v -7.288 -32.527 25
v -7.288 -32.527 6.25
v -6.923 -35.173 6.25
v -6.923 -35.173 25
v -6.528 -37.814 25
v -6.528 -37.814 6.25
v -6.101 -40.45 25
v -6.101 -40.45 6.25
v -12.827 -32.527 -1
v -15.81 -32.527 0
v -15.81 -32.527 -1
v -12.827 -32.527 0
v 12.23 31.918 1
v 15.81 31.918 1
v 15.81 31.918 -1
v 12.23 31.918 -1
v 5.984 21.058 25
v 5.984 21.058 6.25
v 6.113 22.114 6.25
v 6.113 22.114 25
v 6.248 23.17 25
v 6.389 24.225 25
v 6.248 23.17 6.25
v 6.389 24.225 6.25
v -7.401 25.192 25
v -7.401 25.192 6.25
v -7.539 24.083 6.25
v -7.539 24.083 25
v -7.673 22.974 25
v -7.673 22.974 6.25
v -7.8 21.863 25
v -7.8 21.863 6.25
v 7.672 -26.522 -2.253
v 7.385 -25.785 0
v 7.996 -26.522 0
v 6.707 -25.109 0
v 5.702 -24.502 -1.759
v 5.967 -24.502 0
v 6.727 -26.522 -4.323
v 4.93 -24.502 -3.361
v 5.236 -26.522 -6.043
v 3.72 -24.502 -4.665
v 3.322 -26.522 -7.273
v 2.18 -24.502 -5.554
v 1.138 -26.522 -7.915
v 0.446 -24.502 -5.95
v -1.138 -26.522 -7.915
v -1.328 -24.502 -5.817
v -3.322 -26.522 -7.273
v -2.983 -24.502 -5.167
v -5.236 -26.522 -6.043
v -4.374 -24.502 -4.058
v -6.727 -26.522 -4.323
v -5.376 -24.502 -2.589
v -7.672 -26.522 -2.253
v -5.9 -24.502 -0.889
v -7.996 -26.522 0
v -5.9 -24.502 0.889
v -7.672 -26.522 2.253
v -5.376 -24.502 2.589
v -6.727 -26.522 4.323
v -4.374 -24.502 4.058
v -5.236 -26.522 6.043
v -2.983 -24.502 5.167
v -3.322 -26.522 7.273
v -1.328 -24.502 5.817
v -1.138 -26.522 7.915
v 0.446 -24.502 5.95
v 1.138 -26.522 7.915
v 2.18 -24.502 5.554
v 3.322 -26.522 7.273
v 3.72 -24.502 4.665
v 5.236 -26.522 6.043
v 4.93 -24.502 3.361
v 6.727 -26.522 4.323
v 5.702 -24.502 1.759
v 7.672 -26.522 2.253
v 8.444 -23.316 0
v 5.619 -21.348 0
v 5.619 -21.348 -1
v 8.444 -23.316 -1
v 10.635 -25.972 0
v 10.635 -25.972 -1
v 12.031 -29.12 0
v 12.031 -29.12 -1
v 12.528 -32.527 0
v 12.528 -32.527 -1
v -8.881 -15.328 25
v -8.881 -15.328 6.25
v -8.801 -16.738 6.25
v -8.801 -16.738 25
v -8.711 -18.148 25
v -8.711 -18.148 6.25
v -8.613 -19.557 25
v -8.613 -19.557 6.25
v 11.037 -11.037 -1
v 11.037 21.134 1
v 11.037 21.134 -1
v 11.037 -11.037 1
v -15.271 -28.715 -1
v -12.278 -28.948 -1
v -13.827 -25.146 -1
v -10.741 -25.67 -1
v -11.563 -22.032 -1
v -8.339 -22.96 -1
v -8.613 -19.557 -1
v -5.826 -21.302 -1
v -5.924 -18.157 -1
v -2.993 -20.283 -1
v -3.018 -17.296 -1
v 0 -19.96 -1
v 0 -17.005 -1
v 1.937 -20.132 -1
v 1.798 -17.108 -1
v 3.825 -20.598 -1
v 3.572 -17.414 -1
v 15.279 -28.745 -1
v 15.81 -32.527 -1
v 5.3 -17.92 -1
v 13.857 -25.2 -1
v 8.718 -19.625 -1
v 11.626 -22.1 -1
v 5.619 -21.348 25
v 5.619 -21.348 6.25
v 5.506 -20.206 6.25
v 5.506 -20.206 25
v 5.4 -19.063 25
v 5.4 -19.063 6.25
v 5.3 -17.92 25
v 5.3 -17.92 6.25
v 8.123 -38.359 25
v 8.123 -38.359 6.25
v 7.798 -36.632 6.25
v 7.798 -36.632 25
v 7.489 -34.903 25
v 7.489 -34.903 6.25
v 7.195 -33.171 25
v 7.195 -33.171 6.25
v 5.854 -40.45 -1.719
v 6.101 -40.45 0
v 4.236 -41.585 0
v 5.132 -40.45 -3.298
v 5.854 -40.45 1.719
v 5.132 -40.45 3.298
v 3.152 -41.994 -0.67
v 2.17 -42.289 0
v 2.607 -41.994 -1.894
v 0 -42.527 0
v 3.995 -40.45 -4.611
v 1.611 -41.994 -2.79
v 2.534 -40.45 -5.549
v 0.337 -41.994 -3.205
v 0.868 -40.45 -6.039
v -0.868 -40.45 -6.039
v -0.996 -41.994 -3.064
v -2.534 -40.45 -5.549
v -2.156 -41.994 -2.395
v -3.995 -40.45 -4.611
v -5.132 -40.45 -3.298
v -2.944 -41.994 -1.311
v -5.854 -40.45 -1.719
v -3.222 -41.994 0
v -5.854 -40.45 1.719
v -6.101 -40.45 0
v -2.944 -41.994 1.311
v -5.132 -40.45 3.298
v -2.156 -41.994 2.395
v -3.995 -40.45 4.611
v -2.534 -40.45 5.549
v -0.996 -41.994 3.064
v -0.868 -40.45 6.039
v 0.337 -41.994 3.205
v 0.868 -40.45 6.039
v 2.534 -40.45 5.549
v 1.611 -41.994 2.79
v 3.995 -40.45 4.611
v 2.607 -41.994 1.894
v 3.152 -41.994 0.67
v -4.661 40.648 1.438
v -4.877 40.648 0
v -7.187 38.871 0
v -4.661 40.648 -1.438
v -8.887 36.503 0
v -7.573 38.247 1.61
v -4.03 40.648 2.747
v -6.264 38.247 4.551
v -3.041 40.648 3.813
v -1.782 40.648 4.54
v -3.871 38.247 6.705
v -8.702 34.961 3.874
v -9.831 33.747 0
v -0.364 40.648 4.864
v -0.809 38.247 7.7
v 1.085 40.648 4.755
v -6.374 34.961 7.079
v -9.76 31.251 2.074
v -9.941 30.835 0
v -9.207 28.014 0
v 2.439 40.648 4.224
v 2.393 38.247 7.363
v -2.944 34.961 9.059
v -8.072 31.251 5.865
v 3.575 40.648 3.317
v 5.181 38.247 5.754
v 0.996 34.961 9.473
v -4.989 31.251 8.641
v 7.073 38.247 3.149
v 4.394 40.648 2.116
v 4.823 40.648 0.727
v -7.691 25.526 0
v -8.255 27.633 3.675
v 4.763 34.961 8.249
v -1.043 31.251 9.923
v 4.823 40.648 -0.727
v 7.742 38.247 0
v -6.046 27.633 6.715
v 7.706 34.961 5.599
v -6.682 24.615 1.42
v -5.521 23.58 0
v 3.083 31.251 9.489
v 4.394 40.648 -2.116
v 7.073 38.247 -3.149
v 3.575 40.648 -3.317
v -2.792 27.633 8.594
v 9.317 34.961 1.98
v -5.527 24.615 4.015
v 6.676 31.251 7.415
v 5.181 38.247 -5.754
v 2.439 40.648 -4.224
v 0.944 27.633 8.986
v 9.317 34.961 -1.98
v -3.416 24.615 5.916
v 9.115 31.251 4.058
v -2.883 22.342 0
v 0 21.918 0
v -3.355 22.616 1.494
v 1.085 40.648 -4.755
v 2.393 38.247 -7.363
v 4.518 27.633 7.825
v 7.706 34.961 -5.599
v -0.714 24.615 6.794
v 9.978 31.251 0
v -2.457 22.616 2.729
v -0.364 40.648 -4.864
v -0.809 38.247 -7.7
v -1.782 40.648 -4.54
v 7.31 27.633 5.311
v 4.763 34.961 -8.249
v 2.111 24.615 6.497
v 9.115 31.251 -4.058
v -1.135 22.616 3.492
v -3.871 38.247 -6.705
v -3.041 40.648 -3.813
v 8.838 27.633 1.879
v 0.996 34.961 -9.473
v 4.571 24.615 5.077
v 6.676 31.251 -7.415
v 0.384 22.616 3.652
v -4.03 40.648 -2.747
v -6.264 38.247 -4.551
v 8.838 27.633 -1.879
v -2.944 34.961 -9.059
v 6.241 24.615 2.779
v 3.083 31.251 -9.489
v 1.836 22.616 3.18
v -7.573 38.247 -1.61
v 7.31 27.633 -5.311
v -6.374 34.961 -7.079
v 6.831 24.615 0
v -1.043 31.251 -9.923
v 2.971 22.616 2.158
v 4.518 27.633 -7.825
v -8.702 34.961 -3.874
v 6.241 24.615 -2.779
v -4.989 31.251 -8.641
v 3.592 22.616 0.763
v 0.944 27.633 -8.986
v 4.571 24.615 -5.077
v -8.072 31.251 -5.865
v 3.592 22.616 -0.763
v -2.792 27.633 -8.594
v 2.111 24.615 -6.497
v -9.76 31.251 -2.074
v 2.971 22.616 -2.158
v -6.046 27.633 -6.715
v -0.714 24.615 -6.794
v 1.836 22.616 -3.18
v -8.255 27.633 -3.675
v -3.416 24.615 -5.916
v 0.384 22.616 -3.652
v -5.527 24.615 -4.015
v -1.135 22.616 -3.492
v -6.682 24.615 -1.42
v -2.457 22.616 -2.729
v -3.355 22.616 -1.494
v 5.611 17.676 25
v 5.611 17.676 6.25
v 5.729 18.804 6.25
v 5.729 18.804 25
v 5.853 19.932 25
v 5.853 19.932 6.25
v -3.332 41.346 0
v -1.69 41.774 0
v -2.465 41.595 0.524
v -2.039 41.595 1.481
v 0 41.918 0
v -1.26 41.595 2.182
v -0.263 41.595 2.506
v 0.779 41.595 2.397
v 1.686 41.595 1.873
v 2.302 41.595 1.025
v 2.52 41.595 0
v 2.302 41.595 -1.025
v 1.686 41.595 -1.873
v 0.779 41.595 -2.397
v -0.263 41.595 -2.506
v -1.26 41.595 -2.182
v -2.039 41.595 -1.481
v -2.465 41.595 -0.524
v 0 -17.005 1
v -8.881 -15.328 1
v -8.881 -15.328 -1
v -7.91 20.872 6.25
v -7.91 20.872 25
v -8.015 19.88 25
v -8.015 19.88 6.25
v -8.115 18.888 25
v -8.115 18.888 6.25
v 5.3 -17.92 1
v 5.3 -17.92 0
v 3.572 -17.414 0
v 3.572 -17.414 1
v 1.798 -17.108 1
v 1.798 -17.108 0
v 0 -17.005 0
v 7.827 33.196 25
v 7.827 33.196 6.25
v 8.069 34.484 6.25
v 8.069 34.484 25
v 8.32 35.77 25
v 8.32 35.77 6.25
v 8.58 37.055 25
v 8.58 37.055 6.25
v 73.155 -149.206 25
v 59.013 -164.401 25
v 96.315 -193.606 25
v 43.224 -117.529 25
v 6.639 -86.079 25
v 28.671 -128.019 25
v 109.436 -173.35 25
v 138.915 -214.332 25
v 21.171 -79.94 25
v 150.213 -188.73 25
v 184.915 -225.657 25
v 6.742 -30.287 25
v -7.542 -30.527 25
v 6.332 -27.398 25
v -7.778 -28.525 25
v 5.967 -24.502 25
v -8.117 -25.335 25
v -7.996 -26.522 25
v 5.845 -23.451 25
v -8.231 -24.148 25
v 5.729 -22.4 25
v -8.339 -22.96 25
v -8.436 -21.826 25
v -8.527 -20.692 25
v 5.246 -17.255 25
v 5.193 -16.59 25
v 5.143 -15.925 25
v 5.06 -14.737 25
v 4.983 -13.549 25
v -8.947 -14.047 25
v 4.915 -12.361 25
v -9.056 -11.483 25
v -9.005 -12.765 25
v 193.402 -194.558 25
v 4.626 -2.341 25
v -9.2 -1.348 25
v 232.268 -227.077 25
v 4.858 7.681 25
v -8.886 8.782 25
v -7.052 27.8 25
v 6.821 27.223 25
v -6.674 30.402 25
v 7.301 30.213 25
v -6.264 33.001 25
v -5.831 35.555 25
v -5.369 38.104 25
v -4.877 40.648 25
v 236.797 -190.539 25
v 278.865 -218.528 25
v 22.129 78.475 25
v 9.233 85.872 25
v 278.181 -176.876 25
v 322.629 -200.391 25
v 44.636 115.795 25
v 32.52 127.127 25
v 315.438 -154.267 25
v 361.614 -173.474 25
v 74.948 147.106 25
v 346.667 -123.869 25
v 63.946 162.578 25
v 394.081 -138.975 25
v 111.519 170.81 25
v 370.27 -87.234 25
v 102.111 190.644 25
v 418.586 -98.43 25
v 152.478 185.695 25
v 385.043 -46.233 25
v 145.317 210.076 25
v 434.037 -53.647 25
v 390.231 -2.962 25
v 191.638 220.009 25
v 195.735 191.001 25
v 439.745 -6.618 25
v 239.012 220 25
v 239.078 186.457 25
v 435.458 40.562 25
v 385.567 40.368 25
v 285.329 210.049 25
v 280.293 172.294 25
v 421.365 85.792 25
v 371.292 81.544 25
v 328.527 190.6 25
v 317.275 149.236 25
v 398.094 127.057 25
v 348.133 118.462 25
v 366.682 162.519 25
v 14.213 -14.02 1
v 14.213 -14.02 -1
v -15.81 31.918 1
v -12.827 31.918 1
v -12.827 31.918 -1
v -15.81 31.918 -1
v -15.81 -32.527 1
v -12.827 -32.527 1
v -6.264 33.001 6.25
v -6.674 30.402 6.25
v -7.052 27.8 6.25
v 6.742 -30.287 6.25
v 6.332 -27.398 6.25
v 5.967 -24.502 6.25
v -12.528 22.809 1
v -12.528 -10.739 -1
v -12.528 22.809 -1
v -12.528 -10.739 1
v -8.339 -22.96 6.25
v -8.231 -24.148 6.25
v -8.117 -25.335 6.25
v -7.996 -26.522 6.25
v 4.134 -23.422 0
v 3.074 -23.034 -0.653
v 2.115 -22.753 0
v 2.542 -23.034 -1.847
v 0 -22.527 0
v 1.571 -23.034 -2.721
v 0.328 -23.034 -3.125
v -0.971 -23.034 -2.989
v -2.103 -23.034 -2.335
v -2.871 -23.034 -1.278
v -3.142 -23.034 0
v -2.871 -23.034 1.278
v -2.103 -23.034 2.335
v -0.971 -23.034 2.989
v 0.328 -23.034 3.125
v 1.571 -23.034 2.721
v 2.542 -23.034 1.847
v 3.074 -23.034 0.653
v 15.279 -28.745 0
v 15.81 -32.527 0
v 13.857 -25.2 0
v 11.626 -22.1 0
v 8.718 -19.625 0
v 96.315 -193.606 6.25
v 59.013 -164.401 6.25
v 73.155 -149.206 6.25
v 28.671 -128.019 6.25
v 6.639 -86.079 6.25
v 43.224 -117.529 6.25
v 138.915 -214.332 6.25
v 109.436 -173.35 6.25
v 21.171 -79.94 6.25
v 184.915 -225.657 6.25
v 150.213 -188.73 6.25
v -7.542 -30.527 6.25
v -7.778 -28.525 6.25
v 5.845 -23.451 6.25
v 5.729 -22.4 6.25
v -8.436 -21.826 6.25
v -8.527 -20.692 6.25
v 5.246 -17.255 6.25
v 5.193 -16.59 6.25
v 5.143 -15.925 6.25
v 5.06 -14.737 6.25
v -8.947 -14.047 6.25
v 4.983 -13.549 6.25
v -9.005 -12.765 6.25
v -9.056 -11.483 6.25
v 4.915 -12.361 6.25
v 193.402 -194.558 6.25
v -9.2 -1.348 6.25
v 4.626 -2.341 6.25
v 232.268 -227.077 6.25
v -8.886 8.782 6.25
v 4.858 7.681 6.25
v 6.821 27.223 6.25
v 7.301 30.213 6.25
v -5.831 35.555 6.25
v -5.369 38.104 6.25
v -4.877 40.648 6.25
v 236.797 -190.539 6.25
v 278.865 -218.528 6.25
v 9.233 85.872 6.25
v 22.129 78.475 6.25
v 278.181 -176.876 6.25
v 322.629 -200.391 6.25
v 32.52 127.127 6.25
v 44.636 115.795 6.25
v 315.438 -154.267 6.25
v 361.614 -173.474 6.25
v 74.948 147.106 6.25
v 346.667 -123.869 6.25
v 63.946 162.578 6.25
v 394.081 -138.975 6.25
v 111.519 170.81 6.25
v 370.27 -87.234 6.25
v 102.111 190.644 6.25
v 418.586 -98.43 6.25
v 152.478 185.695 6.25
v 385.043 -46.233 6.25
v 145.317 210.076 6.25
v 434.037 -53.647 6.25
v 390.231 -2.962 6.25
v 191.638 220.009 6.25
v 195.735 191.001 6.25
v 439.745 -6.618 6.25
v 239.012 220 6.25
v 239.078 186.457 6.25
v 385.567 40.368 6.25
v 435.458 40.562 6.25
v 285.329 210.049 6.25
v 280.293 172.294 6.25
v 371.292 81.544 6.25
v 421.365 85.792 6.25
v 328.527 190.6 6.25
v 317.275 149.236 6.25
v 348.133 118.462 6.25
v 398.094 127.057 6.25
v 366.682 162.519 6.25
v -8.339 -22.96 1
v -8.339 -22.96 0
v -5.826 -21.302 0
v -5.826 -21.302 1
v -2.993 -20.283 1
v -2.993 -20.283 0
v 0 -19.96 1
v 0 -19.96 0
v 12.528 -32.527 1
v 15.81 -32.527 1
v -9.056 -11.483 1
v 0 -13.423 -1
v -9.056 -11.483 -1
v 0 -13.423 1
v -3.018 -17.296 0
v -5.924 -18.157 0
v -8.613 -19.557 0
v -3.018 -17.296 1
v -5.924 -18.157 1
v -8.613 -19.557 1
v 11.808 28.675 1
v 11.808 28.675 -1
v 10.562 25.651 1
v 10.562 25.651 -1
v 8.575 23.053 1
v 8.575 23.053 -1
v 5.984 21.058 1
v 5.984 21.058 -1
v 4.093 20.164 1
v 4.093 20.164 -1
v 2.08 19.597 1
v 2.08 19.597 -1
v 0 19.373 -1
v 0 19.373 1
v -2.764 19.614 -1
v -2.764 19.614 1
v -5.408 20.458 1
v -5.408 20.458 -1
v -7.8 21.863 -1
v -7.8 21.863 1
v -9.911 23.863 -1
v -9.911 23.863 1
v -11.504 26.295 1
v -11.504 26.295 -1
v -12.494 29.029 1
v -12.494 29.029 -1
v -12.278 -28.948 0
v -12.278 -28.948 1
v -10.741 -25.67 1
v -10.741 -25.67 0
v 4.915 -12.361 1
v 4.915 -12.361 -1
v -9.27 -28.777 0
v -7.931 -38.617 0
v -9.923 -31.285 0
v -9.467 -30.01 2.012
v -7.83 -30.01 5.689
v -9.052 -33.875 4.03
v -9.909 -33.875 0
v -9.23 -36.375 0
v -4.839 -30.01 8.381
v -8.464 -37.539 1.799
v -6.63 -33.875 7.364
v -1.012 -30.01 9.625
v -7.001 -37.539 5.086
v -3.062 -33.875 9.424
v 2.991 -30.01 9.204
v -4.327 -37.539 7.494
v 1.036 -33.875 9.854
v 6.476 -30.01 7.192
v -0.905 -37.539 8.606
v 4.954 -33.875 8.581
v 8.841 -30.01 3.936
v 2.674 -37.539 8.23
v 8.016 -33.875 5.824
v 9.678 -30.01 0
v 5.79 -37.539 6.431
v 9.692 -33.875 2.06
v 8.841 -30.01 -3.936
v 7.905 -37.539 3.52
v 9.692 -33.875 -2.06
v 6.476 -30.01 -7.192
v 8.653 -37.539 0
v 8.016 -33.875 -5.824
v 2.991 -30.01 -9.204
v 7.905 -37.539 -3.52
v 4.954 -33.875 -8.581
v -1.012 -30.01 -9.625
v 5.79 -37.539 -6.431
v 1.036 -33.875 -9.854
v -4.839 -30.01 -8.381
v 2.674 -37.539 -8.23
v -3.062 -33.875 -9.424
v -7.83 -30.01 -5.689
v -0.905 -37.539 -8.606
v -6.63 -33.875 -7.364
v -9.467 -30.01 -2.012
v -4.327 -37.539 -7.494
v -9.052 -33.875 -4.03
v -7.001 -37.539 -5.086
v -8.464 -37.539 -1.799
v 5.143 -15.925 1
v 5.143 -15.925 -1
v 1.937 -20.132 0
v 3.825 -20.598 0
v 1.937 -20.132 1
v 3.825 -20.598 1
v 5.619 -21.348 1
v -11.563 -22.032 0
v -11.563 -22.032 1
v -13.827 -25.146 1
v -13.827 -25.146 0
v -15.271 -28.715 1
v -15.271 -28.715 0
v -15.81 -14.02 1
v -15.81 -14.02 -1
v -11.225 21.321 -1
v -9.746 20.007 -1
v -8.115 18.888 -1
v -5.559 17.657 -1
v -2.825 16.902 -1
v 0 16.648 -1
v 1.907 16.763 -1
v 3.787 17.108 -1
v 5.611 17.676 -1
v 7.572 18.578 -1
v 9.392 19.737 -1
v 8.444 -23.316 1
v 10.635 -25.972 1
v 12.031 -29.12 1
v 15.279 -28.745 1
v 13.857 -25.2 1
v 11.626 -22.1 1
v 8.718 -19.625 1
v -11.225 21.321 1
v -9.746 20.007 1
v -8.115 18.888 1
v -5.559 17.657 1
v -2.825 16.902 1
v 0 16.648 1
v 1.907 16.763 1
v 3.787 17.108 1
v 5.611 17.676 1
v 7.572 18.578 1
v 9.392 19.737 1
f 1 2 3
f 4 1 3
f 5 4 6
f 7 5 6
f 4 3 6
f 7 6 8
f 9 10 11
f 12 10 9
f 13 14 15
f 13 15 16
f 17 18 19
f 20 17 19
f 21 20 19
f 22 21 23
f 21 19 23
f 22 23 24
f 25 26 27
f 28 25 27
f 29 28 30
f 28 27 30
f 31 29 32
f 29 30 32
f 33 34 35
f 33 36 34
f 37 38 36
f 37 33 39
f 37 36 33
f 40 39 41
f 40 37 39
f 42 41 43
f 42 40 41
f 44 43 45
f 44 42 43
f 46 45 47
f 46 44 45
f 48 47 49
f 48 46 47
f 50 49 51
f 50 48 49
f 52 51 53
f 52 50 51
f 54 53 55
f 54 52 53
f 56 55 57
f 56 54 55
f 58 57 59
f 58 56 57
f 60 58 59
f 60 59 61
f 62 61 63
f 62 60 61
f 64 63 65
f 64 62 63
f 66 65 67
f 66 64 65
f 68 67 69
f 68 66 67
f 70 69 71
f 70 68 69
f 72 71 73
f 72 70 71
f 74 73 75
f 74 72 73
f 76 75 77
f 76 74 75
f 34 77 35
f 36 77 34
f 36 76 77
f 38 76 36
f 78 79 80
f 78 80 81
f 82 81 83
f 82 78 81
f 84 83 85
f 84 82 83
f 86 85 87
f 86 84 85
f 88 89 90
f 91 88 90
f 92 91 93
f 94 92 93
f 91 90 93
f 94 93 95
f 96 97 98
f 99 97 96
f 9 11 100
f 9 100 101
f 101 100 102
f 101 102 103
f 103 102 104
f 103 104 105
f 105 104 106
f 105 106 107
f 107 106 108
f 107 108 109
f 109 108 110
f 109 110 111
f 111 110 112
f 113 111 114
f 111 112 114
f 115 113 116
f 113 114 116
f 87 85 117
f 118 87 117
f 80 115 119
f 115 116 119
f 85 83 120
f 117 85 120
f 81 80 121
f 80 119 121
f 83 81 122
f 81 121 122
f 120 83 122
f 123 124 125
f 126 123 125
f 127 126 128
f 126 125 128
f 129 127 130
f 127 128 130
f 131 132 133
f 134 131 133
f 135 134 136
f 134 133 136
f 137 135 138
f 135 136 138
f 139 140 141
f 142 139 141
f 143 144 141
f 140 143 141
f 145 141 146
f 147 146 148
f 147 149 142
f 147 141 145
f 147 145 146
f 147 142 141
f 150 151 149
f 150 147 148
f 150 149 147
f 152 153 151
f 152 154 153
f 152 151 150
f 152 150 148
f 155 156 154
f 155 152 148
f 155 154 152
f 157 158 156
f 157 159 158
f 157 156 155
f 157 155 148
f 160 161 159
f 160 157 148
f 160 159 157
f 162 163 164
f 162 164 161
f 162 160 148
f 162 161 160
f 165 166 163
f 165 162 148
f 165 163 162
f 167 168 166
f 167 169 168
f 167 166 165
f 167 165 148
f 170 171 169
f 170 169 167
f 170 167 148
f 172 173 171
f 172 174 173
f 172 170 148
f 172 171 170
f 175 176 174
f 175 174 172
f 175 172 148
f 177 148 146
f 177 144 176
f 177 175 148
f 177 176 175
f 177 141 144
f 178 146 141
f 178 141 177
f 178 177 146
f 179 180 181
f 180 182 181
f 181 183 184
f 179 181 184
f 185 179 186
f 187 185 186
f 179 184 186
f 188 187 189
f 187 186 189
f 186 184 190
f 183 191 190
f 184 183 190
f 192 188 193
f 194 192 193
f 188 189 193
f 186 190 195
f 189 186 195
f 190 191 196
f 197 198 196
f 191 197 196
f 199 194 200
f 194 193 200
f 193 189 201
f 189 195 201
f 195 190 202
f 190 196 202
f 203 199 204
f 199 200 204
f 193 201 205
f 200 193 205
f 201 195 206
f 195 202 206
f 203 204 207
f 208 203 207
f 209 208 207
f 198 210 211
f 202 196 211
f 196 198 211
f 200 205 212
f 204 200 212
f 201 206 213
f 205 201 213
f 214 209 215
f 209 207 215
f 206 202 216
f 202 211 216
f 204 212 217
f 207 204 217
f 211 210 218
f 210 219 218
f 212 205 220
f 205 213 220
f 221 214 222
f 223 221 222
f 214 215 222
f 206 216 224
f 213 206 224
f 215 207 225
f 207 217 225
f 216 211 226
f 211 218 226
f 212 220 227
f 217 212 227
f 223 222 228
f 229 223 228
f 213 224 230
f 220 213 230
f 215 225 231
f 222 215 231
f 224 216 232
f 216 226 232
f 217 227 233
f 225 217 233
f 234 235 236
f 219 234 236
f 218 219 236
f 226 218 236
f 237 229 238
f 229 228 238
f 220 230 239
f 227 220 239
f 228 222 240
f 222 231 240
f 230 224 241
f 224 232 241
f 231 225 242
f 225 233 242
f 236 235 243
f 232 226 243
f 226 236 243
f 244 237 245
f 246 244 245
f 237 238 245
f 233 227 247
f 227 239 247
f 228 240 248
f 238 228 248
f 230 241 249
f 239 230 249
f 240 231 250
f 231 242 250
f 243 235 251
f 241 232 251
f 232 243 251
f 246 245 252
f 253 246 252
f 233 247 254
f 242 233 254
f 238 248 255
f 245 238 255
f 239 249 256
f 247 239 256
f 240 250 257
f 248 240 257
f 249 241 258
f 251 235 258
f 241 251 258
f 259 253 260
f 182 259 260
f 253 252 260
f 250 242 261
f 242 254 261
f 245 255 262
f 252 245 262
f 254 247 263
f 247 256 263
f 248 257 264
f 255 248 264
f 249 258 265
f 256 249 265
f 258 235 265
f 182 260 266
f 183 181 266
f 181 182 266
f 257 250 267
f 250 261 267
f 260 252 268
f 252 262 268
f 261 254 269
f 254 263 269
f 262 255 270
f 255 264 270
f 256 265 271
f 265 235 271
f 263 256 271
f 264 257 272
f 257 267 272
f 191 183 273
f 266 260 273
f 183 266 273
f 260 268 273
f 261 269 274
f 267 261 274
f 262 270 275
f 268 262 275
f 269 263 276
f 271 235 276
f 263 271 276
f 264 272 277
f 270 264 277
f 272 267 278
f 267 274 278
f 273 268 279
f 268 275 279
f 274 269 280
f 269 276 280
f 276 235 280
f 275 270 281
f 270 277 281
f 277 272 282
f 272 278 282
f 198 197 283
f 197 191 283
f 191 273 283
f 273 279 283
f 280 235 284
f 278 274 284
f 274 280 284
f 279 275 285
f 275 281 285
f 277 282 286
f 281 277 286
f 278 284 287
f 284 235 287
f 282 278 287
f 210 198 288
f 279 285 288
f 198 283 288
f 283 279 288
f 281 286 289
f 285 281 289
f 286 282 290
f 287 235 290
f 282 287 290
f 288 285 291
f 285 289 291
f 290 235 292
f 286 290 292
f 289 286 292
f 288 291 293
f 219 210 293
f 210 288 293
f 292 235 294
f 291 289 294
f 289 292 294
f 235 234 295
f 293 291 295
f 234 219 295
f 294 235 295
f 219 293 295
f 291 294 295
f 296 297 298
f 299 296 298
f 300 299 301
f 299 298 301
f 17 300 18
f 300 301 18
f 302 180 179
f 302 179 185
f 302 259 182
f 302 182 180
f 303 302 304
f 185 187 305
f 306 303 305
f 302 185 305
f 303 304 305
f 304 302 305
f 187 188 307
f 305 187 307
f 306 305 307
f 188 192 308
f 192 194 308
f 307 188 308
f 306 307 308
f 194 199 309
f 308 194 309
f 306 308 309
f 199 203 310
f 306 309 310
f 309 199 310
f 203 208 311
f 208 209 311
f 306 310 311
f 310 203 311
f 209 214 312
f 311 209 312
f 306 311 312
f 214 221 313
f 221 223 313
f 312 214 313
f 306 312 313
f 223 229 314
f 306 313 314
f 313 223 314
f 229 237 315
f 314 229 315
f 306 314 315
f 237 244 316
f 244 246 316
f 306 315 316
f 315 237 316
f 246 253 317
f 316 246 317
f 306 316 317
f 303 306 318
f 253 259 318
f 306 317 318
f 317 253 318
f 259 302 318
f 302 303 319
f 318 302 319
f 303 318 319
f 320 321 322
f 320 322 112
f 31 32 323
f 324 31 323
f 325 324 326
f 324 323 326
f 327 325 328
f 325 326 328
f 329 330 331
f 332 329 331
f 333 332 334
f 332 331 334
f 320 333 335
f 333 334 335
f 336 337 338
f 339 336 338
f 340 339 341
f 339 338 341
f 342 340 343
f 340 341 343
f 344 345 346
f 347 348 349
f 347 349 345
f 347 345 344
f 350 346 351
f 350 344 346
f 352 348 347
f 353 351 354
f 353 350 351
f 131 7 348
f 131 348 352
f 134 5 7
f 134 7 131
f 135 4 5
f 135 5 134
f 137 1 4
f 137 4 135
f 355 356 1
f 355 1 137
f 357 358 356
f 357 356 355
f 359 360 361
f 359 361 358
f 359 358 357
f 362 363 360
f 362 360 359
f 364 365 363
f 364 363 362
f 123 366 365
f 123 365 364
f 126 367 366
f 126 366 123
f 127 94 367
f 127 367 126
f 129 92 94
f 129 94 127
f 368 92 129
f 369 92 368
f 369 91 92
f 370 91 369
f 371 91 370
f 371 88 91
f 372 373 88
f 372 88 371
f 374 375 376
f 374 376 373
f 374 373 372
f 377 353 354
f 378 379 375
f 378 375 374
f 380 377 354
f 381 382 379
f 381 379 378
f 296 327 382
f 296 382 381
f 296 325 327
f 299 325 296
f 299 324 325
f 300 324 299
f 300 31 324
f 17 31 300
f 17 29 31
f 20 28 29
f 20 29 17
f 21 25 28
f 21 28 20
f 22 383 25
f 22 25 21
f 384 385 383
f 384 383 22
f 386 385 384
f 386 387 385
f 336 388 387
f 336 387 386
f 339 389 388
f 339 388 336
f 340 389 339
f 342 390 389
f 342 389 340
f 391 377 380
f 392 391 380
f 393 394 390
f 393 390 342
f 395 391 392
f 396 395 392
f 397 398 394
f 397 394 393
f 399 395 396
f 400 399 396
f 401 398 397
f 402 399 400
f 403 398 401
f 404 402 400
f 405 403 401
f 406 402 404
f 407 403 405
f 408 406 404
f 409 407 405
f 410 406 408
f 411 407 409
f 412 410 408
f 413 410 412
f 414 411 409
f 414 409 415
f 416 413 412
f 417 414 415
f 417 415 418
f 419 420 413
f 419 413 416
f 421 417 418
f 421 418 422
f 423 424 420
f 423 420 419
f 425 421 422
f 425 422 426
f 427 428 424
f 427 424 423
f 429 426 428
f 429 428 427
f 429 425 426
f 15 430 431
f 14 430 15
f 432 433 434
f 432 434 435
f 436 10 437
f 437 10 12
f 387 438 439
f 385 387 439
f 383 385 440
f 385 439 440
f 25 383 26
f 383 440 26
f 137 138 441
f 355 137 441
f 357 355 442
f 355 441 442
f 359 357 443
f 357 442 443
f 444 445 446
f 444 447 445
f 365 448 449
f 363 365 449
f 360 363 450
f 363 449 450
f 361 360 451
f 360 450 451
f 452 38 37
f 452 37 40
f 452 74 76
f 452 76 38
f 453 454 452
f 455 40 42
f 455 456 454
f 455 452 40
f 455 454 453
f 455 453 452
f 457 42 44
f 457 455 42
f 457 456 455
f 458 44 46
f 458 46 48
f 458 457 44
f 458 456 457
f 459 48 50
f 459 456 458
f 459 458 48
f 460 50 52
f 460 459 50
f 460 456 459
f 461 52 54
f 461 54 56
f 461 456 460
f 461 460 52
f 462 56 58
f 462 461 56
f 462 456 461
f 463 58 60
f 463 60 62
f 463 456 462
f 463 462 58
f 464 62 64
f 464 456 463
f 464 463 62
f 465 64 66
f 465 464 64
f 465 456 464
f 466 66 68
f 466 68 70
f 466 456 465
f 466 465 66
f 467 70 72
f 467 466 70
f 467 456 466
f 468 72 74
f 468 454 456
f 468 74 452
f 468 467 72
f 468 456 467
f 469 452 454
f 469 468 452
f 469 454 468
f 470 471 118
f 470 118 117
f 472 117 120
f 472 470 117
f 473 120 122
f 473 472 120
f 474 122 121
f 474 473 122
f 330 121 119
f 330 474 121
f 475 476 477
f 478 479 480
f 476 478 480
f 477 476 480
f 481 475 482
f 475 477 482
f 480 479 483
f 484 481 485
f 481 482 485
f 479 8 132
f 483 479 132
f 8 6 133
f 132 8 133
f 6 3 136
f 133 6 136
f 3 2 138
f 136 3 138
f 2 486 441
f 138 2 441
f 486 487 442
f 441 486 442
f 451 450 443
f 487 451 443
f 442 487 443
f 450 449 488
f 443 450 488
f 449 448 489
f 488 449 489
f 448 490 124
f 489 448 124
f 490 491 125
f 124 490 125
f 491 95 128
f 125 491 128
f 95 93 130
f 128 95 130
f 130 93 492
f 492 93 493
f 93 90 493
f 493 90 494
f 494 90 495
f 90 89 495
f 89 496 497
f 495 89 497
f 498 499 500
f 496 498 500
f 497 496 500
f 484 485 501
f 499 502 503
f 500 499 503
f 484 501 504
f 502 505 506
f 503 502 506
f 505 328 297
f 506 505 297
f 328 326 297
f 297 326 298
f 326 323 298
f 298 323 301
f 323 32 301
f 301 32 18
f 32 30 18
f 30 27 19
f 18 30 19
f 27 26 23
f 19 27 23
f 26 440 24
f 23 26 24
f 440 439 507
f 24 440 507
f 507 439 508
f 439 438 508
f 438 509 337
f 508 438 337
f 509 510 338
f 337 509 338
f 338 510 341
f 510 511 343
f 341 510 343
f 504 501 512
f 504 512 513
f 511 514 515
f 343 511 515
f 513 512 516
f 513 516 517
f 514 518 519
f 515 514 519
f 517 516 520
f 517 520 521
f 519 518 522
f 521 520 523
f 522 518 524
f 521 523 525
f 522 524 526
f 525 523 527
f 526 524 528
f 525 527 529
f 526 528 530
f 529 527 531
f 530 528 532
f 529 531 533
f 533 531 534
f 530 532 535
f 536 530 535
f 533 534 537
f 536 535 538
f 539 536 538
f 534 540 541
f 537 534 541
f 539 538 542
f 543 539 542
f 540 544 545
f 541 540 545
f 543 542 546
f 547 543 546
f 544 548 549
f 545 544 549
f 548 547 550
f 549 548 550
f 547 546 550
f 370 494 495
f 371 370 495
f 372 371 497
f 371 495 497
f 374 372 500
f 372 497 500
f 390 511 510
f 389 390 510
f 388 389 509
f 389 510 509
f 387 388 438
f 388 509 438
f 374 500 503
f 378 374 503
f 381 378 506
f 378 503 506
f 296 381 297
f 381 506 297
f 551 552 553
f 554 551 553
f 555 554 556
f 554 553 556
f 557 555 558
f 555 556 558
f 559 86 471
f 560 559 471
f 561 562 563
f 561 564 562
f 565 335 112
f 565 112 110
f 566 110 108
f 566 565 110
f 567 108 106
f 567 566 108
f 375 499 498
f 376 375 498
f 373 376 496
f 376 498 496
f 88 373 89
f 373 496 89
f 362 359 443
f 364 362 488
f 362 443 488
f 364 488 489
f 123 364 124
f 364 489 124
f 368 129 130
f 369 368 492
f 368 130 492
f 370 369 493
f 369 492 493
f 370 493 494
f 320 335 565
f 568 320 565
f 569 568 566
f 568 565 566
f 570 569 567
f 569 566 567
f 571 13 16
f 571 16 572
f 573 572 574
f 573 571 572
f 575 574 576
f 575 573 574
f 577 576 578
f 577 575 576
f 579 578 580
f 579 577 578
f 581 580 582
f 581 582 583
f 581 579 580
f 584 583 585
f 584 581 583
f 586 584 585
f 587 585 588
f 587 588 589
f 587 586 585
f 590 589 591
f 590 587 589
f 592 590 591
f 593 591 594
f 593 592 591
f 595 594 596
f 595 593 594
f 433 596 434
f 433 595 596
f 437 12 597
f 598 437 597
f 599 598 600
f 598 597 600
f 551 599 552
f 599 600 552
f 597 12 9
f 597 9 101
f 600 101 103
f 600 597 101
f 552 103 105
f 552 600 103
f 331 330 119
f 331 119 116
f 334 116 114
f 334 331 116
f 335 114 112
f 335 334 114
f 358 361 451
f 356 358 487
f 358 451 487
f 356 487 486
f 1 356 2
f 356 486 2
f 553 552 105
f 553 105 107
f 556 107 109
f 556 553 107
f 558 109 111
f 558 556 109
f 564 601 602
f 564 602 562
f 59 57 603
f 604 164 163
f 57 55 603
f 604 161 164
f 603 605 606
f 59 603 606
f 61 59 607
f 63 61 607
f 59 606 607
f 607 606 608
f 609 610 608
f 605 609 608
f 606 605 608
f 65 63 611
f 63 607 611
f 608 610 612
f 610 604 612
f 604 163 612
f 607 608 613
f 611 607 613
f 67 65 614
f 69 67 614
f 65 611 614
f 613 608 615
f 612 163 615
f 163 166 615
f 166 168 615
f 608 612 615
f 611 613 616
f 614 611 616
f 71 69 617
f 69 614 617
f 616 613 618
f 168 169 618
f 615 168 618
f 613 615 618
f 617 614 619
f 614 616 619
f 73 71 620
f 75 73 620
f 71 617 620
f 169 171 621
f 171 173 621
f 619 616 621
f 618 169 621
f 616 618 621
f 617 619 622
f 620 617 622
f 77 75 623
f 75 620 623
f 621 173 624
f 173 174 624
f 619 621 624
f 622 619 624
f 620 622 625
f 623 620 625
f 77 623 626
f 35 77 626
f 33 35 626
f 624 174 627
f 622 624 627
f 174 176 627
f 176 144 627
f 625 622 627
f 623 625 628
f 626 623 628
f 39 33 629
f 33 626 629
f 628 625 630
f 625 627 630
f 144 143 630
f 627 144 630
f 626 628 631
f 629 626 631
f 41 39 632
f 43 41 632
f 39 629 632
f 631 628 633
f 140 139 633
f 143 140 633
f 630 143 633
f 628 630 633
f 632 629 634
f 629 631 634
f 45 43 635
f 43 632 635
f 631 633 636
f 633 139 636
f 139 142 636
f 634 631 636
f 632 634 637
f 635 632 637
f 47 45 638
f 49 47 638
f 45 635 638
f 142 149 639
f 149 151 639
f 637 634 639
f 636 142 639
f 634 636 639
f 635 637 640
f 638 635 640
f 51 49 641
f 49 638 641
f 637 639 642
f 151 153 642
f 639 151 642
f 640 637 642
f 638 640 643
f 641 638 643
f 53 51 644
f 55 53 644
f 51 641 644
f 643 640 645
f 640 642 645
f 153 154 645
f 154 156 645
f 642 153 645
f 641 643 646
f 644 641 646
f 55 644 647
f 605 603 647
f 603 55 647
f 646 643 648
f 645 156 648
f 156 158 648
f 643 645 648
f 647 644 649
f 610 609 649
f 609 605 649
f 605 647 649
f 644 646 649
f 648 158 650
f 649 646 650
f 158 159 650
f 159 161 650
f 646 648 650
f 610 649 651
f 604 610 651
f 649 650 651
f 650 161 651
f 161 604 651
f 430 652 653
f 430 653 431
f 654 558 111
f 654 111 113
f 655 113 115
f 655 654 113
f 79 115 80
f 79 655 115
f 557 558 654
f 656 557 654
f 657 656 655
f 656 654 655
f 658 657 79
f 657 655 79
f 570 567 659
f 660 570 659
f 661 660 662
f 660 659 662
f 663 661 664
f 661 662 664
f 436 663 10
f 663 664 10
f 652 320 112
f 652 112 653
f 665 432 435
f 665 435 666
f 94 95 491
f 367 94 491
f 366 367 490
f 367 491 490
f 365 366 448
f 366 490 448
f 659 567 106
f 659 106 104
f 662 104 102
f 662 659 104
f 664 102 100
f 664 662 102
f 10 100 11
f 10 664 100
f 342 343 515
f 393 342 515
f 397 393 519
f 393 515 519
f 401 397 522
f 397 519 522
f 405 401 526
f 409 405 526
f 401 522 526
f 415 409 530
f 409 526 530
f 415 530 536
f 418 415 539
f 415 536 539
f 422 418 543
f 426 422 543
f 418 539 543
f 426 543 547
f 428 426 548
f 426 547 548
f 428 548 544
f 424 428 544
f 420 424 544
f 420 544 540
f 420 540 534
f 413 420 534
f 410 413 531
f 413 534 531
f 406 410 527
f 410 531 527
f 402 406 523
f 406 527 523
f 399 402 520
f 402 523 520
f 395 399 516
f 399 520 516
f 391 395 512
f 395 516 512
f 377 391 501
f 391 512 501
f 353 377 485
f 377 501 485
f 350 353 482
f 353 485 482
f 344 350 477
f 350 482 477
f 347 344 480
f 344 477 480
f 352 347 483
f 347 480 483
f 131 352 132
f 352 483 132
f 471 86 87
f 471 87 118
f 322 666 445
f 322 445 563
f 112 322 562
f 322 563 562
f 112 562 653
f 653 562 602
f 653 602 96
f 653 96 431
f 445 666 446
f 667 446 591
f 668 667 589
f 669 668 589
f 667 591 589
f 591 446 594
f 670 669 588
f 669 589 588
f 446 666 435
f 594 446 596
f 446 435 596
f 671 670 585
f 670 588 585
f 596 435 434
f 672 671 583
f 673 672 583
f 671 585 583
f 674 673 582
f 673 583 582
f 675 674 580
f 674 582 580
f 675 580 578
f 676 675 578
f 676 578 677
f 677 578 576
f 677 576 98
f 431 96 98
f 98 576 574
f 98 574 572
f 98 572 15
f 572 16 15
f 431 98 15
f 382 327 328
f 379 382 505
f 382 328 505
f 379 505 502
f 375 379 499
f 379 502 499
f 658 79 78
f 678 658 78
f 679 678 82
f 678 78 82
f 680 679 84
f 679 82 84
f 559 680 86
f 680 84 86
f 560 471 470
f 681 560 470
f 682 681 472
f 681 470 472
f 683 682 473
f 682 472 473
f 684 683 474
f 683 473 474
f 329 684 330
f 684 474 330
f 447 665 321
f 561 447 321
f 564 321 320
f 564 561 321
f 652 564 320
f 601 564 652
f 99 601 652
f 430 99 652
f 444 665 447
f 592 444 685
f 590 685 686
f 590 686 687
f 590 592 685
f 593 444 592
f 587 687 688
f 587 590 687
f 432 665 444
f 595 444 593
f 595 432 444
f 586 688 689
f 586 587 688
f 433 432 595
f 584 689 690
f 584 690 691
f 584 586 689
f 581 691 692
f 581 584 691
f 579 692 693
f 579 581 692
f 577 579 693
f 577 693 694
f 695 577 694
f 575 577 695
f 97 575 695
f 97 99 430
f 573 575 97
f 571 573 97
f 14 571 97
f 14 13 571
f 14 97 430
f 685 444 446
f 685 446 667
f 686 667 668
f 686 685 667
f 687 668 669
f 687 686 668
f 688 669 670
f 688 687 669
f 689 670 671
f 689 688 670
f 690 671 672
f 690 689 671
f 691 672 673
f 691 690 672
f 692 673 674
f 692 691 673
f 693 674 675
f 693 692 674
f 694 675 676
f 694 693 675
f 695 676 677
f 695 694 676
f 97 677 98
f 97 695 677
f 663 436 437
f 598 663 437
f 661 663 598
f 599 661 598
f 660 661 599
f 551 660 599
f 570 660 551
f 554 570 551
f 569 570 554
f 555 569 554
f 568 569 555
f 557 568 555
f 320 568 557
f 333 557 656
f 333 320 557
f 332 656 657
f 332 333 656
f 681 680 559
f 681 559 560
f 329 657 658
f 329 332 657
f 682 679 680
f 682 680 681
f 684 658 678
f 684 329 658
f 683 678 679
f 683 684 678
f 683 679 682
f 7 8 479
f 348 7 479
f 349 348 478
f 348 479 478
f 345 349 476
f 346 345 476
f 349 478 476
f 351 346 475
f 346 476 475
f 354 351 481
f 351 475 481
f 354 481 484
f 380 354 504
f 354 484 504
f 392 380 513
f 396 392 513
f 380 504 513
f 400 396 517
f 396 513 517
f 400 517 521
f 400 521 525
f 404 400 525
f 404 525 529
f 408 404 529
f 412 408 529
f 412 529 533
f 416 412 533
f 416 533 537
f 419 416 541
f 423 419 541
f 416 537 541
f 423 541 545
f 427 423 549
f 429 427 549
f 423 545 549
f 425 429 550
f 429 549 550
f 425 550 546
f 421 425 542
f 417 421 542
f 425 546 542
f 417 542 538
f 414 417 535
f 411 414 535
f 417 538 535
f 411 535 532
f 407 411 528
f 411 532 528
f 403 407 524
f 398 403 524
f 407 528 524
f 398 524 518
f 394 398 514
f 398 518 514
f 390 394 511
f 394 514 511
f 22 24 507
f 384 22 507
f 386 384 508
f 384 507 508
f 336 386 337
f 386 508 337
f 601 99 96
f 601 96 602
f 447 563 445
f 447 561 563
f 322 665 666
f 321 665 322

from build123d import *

# Parameters (mm, degrees)
F1_DEPTH      = 1
F1_DEPTH_BACK = 1
F3_START      = 6.25
F3_DEPTH      = 18.75


with BuildPart() as f1:
    # F0 (on Top) → F1 (new body, two sides)
    with BuildSketch(Plane.XY) as f1_sk:
        with BuildLine():
            ThreePointArc((5.3003190322, -17.9200269408), (5.4519181466, -19.6345637583), (5.6188172673, -21.3476788955))
            ThreePointArc((5.6188172673, -21.3476788955), (10.6352454567, -25.9720916376), (12.5284092501, -32.5269124468))
            Line((12.5284092501, -32.5269124468), (15.8096607774, -32.5269124468))
            ThreePointArc((15.8096607774, -32.5269124468), (12.8354231694, -23.5827467282), (5.3003190322, -17.9200269408))
        make_face()
        with BuildLine():
            ThreePointArc((0, -19.9604799519), (2.8896243917, -20.3291673494), (5.6188172673, -21.3476788955))
            ThreePointArc((5.6188172673, -21.3476788955), (5.4519181466, -19.6345637583), (5.3003190322, -17.9200269408))
            ThreePointArc((5.3003190322, -17.9200269408), (2.689341962, -17.2356052448), (0, -17.0052270113))
            Line((0, -17.0052270113), (0, -19.9604799519))
        make_face()
        with BuildLine():
            ThreePointArc((-8.3388992418, -22.9597984106), (-4.440045657, -20.7078105735), (0, -19.9604799519))
            Line((0, -19.9604799519), (0, -17.0052270113))
            ThreePointArc((0, -17.0052270113), (-4.4915370969, -17.6565584493), (-8.6130491677, -19.5568943105))
            ThreePointArc((-8.6130491677, -19.5568943105), (-8.4824430271, -21.2588675116), (-8.3388992418, -22.9597984106))
        make_face()
        with BuildLine():
            ThreePointArc((-12.8267044201, -32.5269124468), (-11.6271072761, -27.2534857181), (-8.3388992418, -22.9597984106))
            ThreePointArc((-8.3388992418, -22.9597984106), (-8.4824430271, -21.2588675116), (-8.6130491677, -19.5568943105))
            ThreePointArc((-8.6130491677, -19.5568943105), (-13.8265155726, -25.1457069814), (-15.8096607774, -32.5269124468))
            Line((-15.8096607774, -32.5269124468), (-12.8267044201, -32.5269124468))
        make_face()
    extrude(amount=F1_DEPTH)
    extrude(f1_sk.sketch, amount=-F1_DEPTH_BACK)


with BuildPart() as f1b:
    # F0 (on Top) → F1, piece 2 (new body, two sides)
    with BuildSketch(Plane.XY) as f1_2_sk:
        with BuildLine():
            Line((-8.881291048, -15.3281712863), (0, -17.0052270113))
            Line((0, -17.0052270113), (0, -13.4232956916))
            Line((0, -13.4232956916), (-9.05574971, -11.4827777524))
            ThreePointArc((-9.05574971, -11.4827777523), (-8.9767627231, -13.4058484598), (-8.881291048, -15.3281712863))
        make_face()
        with BuildLine():
            Line((-15.8096607774, -14.0198860317), (-8.881291048, -15.3281712863))
            ThreePointArc((-8.881291048, -15.3281712863), (-8.9767627231, -13.4058484598), (-9.05574971, -11.4827777523))
            Line((-9.05574971, -11.4827777524), (-12.5284092501, -10.738636367))
            Line((-12.5284092501, -10.738636367), (-12.5284092501, 22.808624168))
            ThreePointArc((-12.5284092501, 22.808624168), (-14.8830436931, 27.1059194382), (-15.8096607774, 31.917616725))
            Line((-15.8096607774, 31.917616725), (-15.8096607774, -14.0198860317))
        make_face()
        with BuildLine():
            Line((-12.8267044201, 31.917616725), (-15.8096607774, 31.917616725))
            ThreePointArc((-15.8096607774, 31.917616725), (-14.8830436931, 27.1059194382), (-12.5284092501, 22.808624168))
            ThreePointArc((-12.5284092501, 22.808624168), (-10.5062256605, 20.6405878581), (-8.1150247047, 18.8879424577))
            ThreePointArc((-8.1150247047, 18.8879424577), (-7.9626512783, 20.3762433144), (-7.8003626904, 21.8634956518))
            ThreePointArc((-7.8003626904, 21.8634956518), (-11.504380015, 26.2952180966), (-12.8267044201, 31.917616725))
        make_face()
        with BuildLine():
            ThreePointArc((-8.1150247047, 18.8879424577), (-4.2092582578, 17.2181895505), (0, 16.6478990731))
            Line((0, 16.6478990731), (0, 19.3725855164))
            ThreePointArc((0, 19.3725855164), (-4.1094291672, 19.9627745105), (-7.8003626904, 21.8634956518))
            ThreePointArc((-7.8003626904, 21.8634956518), (-7.9626512783, 20.3762433144), (-8.1150247047, 18.8879424577))
        make_face()
        with BuildLine():
            Line((0, 19.3725855164), (0, 16.6478990731))
            ThreePointArc((0, 16.6478990731), (2.8521073568, 16.9071319802), (5.6107384631, 17.6763344853))
            ThreePointArc((5.6107384631, 17.6763344853), (5.7900143917, 19.3680441711), (5.9842097449, 21.0581062067))
            ThreePointArc((5.9842097449, 21.0581062067), (3.0983174718, 19.8382526132), (0, 19.3725855164))
        make_face()
        with BuildLine():
            ThreePointArc((11.0369324684, 21.1342585721), (14.4656522663, 26.0645896884), (15.8096607774, 31.917616725))
            Line((15.8096607774, 31.917616725), (12.23011408, 31.917616725))
            ThreePointArc((12.23011408, 31.917616725), (10.5619472354, 25.6511340701), (5.9842097449, 21.0581062067))
            ThreePointArc((5.9842097449, 21.0581062067), (5.7900143917, 19.3680441711), (5.6107384631, 17.6763344853))
            ThreePointArc((5.6107384631, 17.6763344853), (8.5015026089, 19.1265002444), (11.0369324684, 21.1342585721))
        make_face()
        with BuildLine():
            ThreePointArc((4.914580284, -12.3606835702), (5.0206899204, -14.1433284216), (5.1433060929, -15.9249140063))
            Line((5.1433060929, -15.9249140063), (14.2130312032, -14.0198860317))
            Line((14.2130312032, -14.0198860317), (15.8096607774, 31.917616725))
            ThreePointArc((15.8096607774, 31.917616725), (14.4656522663, 26.0645896884), (11.0369324684, 21.1342585721))
            Line((11.0369324684, 21.1342585721), (11.0369324684, -11.0369315371))
            Line((11.0369324684, -11.0369315371), (4.914580284, -12.3606835702))
        make_face()
        with BuildLine():
            Line((0, -13.4232956916), (0, -17.0052270113))
            Line((0, -17.0052270113), (5.1433060929, -15.9249140063))
            ThreePointArc((5.1433060929, -15.9249140063), (5.0206899204, -14.1433284216), (4.914580284, -12.3606835702))
            Line((4.914580284, -12.3606835702), (0, -13.4232956916))
        make_face()
    extrude(amount=F1_DEPTH)
    extrude(f1_2_sk.sketch, amount=-F1_DEPTH_BACK)


with BuildPart() as f2:
    # F0 (on Top) → F2 (revolve)
    with BuildSketch(Plane.XY):
        with BuildLine():
            ThreePointArc((8.1234616975, -38.3586677614), (9.5193123957, -35.5900303865), (10, -32.5269124468))
            ThreePointArc((10, -32.5269124468), (8.9349292743, -28.0361398113), (5.9665922274, -24.5019652698))
            ThreePointArc((5.9665922274, -24.5019652698), (6.531492286, -28.8432959991), (7.1948170662, -33.1706814468))
            ThreePointArc((7.1948170662, -33.1706814468), (7.6414114113, -35.767847894), (8.1234616975, -38.3586677614))
        make_face()
        with BuildLine():
            ThreePointArc((7.1948170662, -33.1706814468), (6.531492286, -28.8432959991), (5.9665922274, -24.5019652698))
            ThreePointArc((5.9665922274, -24.5019652698), (3.142493296, -23.0335075842), (0, -22.5269124468))
            Line((0, -22.5269124468), (0, -42.5269124468))
            ThreePointArc((0, -42.5269124468), (4.5652188805, -41.4240342608), (8.1234616975, -38.3586677614))
            ThreePointArc((8.1234616975, -38.3586677614), (7.6414114113, -35.767847894), (7.1948170662, -33.1706814468))
        make_face()
        with BuildLine():
            ThreePointArc((-7.2877490893, -32.5269124468), (-7.6621150003, -29.5266586158), (-7.9960391137, -26.5216348935))
            ThreePointArc((-7.9960391137, -26.5216348935), (-9.908679156, -33.8752734454), (-6.1006233613, -40.4504466711))
            ThreePointArc((-6.1006233613, -40.4504466711), (-6.7295376984, -36.493976014), (-7.2877490893, -32.5269124468))
        make_face()
    revolve(axis=Axis((0, -0.3046478609, 0), (0, 1, 0)))


with BuildPart() as f2b:
    # F0 (on Top) → F2, piece 2 (revolve)
    with BuildSketch(Plane.XY):
        with BuildLine():
            ThreePointArc((10, 31.917616725), (9.6383902497, 34.5824682021), (8.5797133209, 37.0545924239))
            ThreePointArc((8.5797133209, 37.0545924239), (8.1934646149, 35.1273427272), (7.8268833458, 33.1962555647))
            ThreePointArc((7.8268833458, 33.1962555647), (7.0549966282, 28.718887232), (6.3888255555, 24.2245738926))
            ThreePointArc((6.3888255555, 24.2245738926), (9.0522995851, 27.6683965351), (10, 31.917616725))
        make_face()
        with BuildLine():
            Line((0, 21.917616725), (0, 41.917616725))
            ThreePointArc((0, 41.917616725), (-2.5199788975, 41.5948945631), (-4.8773071875, 40.6475579962))
            ThreePointArc((-4.8773071875, 40.6475579962), (-5.6038490401, 36.8301460552), (-6.264204625, 33.0007299781))
            ThreePointArc((-6.264204625, 33.0007299781), (-6.8667625523, 29.1015177407), (-7.4006996933, 25.1923179175))
            ThreePointArc((-7.4006996933, 25.1923179175), (-4.046418906, 22.7728644573), (0, 21.917616725))
        make_face()
        with BuildLine():
            ThreePointArc((-6.264204625, 33.0007299781), (-5.6038490401, 36.8301460552), (-4.8773071875, 40.6475579962))
            ThreePointArc((-4.8773071875, 40.6475579962), (-9.8693198709, 33.5289904514), (-7.4006996933, 25.1923179175))
            ThreePointArc((-7.4006996933, 25.1923179175), (-6.8667625523, 29.1015177407), (-6.264204625, 33.0007299781))
        make_face()
    revolve(axis=Axis((0, -0.3046478609, 0), (0, 1, 0)))


with BuildPart() as f3:
    # F0 (on Top) → F3 (new body)
    with BuildSketch(Plane.XY.offset(F3_START)):
        with BuildLine():
            ThreePointArc((7.1948170662, -33.1706814468), (6.531492286, -28.8432959991), (5.9665922274, -24.5019652698))
            ThreePointArc((5.9665922274, -24.5019652698), (3.142493296, -23.0335075842), (0, -22.5269124468))
            Line((0, -22.5269124468), (0, -42.5269124468))
            ThreePointArc((0, -42.5269124468), (4.5652188805, -41.4240342608), (8.1234616975, -38.3586677614))
            ThreePointArc((8.1234616975, -38.3586677614), (7.6414114113, -35.767847894), (7.1948170662, -33.1706814468))
        make_face()
        with BuildLine():
            ThreePointArc((0, -22.5269124468), (3.142493296, -23.0335075842), (5.9665922274, -24.5019652698))
            ThreePointArc((5.9665922274, -24.5019652698), (5.7862150263, -22.9255376051), (5.6188172673, -21.3476788955))
            ThreePointArc((5.6188172673, -21.3476788955), (2.8896243917, -20.3291673494), (0, -19.9604799519))
            Line((0, -19.9604799519), (0, -22.5269124468))
        make_face()
        with BuildLine():
            ThreePointArc((390.2340564281, -1.7959624641), (215.7943387416, -193.7239033847), (8.1234616975, -38.3586677614))
            ThreePointArc((8.1234616975, -38.3586677614), (4.5652188805, -41.4240342608), (0, -42.5269124468))
            ThreePointArc((0, -42.5269124468), (-3.2221621434, -41.9935734802), (-6.1006233613, -40.4504466711))
            ThreePointArc((-6.1006233613, -40.4504466711), (233.955821601, -226.942723079), (439.7708302282, -3.2316412089))
            ThreePointArc((439.7708302282, -3.2316412089), (237.3278649488, 220.1723371745), (-4.8773071875, 40.6475579962))
            ThreePointArc((-4.8773071875, 40.6475579962), (-2.5199788975, 41.5948945631), (0, 41.917616725))
            ThreePointArc((0, 41.917616725), (4.9310365549, 40.6173223806), (8.5797133209, 37.0545924239))
            ThreePointArc((8.5797133209, 37.0545924239), (216.9551490026, 190.0173603447), (390.2340564281, -1.7959624641))
        make_face()
        with BuildLine():
            Line((0, -42.5269124468), (0, -22.5269124468))
            ThreePointArc((0, -22.5269124468), (-4.4691847393, -23.5811655374), (-7.9960391137, -26.5216348935))
            ThreePointArc((-7.9960391137, -26.5216348935), (-7.6621150003, -29.5266586158), (-7.2877490893, -32.5269124468))
            ThreePointArc((-7.2877490893, -32.5269124468), (-6.7295376984, -36.493976014), (-6.1006233613, -40.4504466711))
            ThreePointArc((-6.1006233613, -40.4504466711), (-3.2221621434, -41.9935734802), (0, -42.5269124468))
        make_face()
        with BuildLine():
            ThreePointArc((-7.9960391137, -26.5216348935), (-4.4691847393, -23.5811655374), (0, -22.5269124468))
            Line((0, -22.5269124468), (0, -19.9604799519))
            ThreePointArc((0, -19.9604799519), (-4.440045657, -20.7078105735), (-8.3388992418, -22.9597984106))
            ThreePointArc((-8.3388992418, -22.9597984106), (-8.1745661374, -24.7413998009), (-7.9960391137, -26.5216348935))
        make_face()
        with BuildLine():
            ThreePointArc((0, -19.9604799519), (2.8896243917, -20.3291673494), (5.6188172673, -21.3476788955))
            ThreePointArc((5.6188172673, -21.3476788955), (5.4519181466, -19.6345637583), (5.3003190322, -17.9200269408))
            ThreePointArc((5.3003190322, -17.9200269408), (2.689341962, -17.2356052448), (0, -17.0052270113))
            Line((0, -17.0052270113), (0, -19.9604799519))
        make_face()
        with BuildLine():
            ThreePointArc((-8.3388992418, -22.9597984106), (-4.440045657, -20.7078105735), (0, -19.9604799519))
            Line((0, -19.9604799519), (0, -17.0052270113))
            ThreePointArc((0, -17.0052270113), (-4.4915370969, -17.6565584493), (-8.6130491677, -19.5568943105))
            ThreePointArc((-8.6130491677, -19.5568943105), (-8.4824430271, -21.2588675116), (-8.3388992418, -22.9597984106))
        make_face()
        with BuildLine():
            ThreePointArc((0, -17.0052270113), (2.689341962, -17.2356052448), (5.3003190322, -17.9200269408))
            ThreePointArc((5.3003190322, -17.9200269408), (5.2192239245, -16.9226741962), (5.1433060929, -15.9249140063))
            Line((5.1433060929, -15.9249140063), (0, -17.0052270113))
        make_face()
        with BuildLine():
            ThreePointArc((7.8268833458, 33.1962555647), (8.1934646149, 35.1273427272), (8.5797133209, 37.0545924239))
            ThreePointArc((8.5797133209, 37.0545924239), (4.9310365549, 40.6173223806), (0, 41.917616725))
            Line((0, 41.917616725), (0, 21.917616725))
            ThreePointArc((0, 21.917616725), (3.3962900109, 22.512021892), (6.3888255555, 24.2245738926))
            ThreePointArc((6.3888255555, 24.2245738926), (7.0549966282, 28.718887232), (7.8268833458, 33.1962555647))
        make_face()
        with BuildLine():
            ThreePointArc((-8.6130491677, -19.5568943105), (-4.4915370969, -17.6565584493), (0, -17.0052270113))
            Line((0, -17.0052270113), (-8.881291048, -15.3281712863))
            ThreePointArc((-8.881291048, -15.3281712863), (-8.7571474494, -17.4431656942), (-8.6130491677, -19.5568943105))
        make_face()
        with BuildLine():
            Line((0, -13.4232956916), (0, -17.0052270113))
            Line((0, -17.0052270113), (5.1433060929, -15.9249140063))
            ThreePointArc((5.1433060929, -15.9249140063), (5.0206899204, -14.1433284216), (4.914580284, -12.3606835702))
            Line((4.914580284, -12.3606835702), (0, -13.4232956916))
        make_face()
        with BuildLine():
            Line((-8.881291048, -15.3281712863), (0, -17.0052270113))
            Line((0, -17.0052270113), (0, -13.4232956916))
            Line((0, -13.4232956916), (-9.05574971, -11.4827777524))
            ThreePointArc((-9.05574971, -11.4827777523), (-8.9767627231, -13.4058484598), (-8.881291048, -15.3281712863))
        make_face()
        with BuildLine():
            Line((0, 21.917616725), (0, 41.917616725))
            ThreePointArc((0, 41.917616725), (-2.5199788975, 41.5948945631), (-4.8773071875, 40.6475579962))
            ThreePointArc((-4.8773071875, 40.6475579962), (-5.6038490401, 36.8301460552), (-6.264204625, 33.0007299781))
            ThreePointArc((-6.264204625, 33.0007299781), (-6.8667625523, 29.1015177407), (-7.4006996933, 25.1923179175))
            ThreePointArc((-7.4006996933, 25.1923179175), (-4.046418906, 22.7728644573), (0, 21.917616725))
        make_face()
        with BuildLine():
            Line((0, 16.6478990731), (0, -13.4232956916))
            Line((0, -13.4232956916), (4.914580284, -12.3606835702))
            ThreePointArc((4.914580284, -12.3606835702), (4.676678319, 2.6714065495), (5.6107384631, 17.6763344853))
            ThreePointArc((5.6107384631, 17.6763344853), (2.8521073568, 16.9071319802), (0, 16.6478990731))
        make_face()
        with BuildLine():
            Line((-9.05574971, -11.4827777524), (0, -13.4232956916))
            Line((0, -13.4232956916), (0, 16.6478990731))
            ThreePointArc((0, 16.6478990731), (-4.2092582578, 17.2181895505), (-8.1150247047, 18.8879424577))
            ThreePointArc((-8.1150247047, 18.8879424577), (-9.0998230799, 3.7185168674), (-9.05574971, -11.4827777523))
        make_face()
        with BuildLine():
            ThreePointArc((5.9842097449, 21.0581062067), (6.1799642421, 22.6421774536), (6.3888255555, 24.2245738926))
            ThreePointArc((6.3888255555, 24.2245738926), (3.3962900109, 22.512021892), (0, 21.917616725))
            Line((0, 21.917616725), (0, 19.3725855164))
            ThreePointArc((0, 19.3725855164), (3.0983174718, 19.8382526132), (5.9842097449, 21.0581062067))
        make_face()
        with BuildLine():
            Line((0, 19.3725855164), (0, 21.917616725))
            ThreePointArc((0, 21.917616725), (-4.046418906, 22.7728644573), (-7.4006996933, 25.1923179175))
            ThreePointArc((-7.4006996933, 25.1923179175), (-7.6067457425, 23.5286529122), (-7.8003626904, 21.8634956518))
            ThreePointArc((-7.8003626904, 21.8634956518), (-4.1094291672, 19.9627745105), (0, 19.3725855164))
        make_face()
        with BuildLine():
            Line((0, 19.3725855164), (0, 16.6478990731))
            ThreePointArc((0, 16.6478990731), (2.8521073568, 16.9071319802), (5.6107384631, 17.6763344853))
            ThreePointArc((5.6107384631, 17.6763344853), (5.7900143917, 19.3680441711), (5.9842097449, 21.0581062067))
            ThreePointArc((5.9842097449, 21.0581062067), (3.0983174718, 19.8382526132), (0, 19.3725855164))
        make_face()
        with BuildLine():
            ThreePointArc((-8.1150247047, 18.8879424577), (-4.2092582578, 17.2181895505), (0, 16.6478990731))
            Line((0, 16.6478990731), (0, 19.3725855164))
            ThreePointArc((0, 19.3725855164), (-4.1094291672, 19.9627745105), (-7.8003626904, 21.8634956518))
            ThreePointArc((-7.8003626904, 21.8634956518), (-7.9626512783, 20.3762433144), (-8.1150247047, 18.8879424577))
        make_face()
    extrude(amount=F3_DEPTH)


solid = Compound([f1.part, f1b.part, f2.part, f2b.part, f3.part])
